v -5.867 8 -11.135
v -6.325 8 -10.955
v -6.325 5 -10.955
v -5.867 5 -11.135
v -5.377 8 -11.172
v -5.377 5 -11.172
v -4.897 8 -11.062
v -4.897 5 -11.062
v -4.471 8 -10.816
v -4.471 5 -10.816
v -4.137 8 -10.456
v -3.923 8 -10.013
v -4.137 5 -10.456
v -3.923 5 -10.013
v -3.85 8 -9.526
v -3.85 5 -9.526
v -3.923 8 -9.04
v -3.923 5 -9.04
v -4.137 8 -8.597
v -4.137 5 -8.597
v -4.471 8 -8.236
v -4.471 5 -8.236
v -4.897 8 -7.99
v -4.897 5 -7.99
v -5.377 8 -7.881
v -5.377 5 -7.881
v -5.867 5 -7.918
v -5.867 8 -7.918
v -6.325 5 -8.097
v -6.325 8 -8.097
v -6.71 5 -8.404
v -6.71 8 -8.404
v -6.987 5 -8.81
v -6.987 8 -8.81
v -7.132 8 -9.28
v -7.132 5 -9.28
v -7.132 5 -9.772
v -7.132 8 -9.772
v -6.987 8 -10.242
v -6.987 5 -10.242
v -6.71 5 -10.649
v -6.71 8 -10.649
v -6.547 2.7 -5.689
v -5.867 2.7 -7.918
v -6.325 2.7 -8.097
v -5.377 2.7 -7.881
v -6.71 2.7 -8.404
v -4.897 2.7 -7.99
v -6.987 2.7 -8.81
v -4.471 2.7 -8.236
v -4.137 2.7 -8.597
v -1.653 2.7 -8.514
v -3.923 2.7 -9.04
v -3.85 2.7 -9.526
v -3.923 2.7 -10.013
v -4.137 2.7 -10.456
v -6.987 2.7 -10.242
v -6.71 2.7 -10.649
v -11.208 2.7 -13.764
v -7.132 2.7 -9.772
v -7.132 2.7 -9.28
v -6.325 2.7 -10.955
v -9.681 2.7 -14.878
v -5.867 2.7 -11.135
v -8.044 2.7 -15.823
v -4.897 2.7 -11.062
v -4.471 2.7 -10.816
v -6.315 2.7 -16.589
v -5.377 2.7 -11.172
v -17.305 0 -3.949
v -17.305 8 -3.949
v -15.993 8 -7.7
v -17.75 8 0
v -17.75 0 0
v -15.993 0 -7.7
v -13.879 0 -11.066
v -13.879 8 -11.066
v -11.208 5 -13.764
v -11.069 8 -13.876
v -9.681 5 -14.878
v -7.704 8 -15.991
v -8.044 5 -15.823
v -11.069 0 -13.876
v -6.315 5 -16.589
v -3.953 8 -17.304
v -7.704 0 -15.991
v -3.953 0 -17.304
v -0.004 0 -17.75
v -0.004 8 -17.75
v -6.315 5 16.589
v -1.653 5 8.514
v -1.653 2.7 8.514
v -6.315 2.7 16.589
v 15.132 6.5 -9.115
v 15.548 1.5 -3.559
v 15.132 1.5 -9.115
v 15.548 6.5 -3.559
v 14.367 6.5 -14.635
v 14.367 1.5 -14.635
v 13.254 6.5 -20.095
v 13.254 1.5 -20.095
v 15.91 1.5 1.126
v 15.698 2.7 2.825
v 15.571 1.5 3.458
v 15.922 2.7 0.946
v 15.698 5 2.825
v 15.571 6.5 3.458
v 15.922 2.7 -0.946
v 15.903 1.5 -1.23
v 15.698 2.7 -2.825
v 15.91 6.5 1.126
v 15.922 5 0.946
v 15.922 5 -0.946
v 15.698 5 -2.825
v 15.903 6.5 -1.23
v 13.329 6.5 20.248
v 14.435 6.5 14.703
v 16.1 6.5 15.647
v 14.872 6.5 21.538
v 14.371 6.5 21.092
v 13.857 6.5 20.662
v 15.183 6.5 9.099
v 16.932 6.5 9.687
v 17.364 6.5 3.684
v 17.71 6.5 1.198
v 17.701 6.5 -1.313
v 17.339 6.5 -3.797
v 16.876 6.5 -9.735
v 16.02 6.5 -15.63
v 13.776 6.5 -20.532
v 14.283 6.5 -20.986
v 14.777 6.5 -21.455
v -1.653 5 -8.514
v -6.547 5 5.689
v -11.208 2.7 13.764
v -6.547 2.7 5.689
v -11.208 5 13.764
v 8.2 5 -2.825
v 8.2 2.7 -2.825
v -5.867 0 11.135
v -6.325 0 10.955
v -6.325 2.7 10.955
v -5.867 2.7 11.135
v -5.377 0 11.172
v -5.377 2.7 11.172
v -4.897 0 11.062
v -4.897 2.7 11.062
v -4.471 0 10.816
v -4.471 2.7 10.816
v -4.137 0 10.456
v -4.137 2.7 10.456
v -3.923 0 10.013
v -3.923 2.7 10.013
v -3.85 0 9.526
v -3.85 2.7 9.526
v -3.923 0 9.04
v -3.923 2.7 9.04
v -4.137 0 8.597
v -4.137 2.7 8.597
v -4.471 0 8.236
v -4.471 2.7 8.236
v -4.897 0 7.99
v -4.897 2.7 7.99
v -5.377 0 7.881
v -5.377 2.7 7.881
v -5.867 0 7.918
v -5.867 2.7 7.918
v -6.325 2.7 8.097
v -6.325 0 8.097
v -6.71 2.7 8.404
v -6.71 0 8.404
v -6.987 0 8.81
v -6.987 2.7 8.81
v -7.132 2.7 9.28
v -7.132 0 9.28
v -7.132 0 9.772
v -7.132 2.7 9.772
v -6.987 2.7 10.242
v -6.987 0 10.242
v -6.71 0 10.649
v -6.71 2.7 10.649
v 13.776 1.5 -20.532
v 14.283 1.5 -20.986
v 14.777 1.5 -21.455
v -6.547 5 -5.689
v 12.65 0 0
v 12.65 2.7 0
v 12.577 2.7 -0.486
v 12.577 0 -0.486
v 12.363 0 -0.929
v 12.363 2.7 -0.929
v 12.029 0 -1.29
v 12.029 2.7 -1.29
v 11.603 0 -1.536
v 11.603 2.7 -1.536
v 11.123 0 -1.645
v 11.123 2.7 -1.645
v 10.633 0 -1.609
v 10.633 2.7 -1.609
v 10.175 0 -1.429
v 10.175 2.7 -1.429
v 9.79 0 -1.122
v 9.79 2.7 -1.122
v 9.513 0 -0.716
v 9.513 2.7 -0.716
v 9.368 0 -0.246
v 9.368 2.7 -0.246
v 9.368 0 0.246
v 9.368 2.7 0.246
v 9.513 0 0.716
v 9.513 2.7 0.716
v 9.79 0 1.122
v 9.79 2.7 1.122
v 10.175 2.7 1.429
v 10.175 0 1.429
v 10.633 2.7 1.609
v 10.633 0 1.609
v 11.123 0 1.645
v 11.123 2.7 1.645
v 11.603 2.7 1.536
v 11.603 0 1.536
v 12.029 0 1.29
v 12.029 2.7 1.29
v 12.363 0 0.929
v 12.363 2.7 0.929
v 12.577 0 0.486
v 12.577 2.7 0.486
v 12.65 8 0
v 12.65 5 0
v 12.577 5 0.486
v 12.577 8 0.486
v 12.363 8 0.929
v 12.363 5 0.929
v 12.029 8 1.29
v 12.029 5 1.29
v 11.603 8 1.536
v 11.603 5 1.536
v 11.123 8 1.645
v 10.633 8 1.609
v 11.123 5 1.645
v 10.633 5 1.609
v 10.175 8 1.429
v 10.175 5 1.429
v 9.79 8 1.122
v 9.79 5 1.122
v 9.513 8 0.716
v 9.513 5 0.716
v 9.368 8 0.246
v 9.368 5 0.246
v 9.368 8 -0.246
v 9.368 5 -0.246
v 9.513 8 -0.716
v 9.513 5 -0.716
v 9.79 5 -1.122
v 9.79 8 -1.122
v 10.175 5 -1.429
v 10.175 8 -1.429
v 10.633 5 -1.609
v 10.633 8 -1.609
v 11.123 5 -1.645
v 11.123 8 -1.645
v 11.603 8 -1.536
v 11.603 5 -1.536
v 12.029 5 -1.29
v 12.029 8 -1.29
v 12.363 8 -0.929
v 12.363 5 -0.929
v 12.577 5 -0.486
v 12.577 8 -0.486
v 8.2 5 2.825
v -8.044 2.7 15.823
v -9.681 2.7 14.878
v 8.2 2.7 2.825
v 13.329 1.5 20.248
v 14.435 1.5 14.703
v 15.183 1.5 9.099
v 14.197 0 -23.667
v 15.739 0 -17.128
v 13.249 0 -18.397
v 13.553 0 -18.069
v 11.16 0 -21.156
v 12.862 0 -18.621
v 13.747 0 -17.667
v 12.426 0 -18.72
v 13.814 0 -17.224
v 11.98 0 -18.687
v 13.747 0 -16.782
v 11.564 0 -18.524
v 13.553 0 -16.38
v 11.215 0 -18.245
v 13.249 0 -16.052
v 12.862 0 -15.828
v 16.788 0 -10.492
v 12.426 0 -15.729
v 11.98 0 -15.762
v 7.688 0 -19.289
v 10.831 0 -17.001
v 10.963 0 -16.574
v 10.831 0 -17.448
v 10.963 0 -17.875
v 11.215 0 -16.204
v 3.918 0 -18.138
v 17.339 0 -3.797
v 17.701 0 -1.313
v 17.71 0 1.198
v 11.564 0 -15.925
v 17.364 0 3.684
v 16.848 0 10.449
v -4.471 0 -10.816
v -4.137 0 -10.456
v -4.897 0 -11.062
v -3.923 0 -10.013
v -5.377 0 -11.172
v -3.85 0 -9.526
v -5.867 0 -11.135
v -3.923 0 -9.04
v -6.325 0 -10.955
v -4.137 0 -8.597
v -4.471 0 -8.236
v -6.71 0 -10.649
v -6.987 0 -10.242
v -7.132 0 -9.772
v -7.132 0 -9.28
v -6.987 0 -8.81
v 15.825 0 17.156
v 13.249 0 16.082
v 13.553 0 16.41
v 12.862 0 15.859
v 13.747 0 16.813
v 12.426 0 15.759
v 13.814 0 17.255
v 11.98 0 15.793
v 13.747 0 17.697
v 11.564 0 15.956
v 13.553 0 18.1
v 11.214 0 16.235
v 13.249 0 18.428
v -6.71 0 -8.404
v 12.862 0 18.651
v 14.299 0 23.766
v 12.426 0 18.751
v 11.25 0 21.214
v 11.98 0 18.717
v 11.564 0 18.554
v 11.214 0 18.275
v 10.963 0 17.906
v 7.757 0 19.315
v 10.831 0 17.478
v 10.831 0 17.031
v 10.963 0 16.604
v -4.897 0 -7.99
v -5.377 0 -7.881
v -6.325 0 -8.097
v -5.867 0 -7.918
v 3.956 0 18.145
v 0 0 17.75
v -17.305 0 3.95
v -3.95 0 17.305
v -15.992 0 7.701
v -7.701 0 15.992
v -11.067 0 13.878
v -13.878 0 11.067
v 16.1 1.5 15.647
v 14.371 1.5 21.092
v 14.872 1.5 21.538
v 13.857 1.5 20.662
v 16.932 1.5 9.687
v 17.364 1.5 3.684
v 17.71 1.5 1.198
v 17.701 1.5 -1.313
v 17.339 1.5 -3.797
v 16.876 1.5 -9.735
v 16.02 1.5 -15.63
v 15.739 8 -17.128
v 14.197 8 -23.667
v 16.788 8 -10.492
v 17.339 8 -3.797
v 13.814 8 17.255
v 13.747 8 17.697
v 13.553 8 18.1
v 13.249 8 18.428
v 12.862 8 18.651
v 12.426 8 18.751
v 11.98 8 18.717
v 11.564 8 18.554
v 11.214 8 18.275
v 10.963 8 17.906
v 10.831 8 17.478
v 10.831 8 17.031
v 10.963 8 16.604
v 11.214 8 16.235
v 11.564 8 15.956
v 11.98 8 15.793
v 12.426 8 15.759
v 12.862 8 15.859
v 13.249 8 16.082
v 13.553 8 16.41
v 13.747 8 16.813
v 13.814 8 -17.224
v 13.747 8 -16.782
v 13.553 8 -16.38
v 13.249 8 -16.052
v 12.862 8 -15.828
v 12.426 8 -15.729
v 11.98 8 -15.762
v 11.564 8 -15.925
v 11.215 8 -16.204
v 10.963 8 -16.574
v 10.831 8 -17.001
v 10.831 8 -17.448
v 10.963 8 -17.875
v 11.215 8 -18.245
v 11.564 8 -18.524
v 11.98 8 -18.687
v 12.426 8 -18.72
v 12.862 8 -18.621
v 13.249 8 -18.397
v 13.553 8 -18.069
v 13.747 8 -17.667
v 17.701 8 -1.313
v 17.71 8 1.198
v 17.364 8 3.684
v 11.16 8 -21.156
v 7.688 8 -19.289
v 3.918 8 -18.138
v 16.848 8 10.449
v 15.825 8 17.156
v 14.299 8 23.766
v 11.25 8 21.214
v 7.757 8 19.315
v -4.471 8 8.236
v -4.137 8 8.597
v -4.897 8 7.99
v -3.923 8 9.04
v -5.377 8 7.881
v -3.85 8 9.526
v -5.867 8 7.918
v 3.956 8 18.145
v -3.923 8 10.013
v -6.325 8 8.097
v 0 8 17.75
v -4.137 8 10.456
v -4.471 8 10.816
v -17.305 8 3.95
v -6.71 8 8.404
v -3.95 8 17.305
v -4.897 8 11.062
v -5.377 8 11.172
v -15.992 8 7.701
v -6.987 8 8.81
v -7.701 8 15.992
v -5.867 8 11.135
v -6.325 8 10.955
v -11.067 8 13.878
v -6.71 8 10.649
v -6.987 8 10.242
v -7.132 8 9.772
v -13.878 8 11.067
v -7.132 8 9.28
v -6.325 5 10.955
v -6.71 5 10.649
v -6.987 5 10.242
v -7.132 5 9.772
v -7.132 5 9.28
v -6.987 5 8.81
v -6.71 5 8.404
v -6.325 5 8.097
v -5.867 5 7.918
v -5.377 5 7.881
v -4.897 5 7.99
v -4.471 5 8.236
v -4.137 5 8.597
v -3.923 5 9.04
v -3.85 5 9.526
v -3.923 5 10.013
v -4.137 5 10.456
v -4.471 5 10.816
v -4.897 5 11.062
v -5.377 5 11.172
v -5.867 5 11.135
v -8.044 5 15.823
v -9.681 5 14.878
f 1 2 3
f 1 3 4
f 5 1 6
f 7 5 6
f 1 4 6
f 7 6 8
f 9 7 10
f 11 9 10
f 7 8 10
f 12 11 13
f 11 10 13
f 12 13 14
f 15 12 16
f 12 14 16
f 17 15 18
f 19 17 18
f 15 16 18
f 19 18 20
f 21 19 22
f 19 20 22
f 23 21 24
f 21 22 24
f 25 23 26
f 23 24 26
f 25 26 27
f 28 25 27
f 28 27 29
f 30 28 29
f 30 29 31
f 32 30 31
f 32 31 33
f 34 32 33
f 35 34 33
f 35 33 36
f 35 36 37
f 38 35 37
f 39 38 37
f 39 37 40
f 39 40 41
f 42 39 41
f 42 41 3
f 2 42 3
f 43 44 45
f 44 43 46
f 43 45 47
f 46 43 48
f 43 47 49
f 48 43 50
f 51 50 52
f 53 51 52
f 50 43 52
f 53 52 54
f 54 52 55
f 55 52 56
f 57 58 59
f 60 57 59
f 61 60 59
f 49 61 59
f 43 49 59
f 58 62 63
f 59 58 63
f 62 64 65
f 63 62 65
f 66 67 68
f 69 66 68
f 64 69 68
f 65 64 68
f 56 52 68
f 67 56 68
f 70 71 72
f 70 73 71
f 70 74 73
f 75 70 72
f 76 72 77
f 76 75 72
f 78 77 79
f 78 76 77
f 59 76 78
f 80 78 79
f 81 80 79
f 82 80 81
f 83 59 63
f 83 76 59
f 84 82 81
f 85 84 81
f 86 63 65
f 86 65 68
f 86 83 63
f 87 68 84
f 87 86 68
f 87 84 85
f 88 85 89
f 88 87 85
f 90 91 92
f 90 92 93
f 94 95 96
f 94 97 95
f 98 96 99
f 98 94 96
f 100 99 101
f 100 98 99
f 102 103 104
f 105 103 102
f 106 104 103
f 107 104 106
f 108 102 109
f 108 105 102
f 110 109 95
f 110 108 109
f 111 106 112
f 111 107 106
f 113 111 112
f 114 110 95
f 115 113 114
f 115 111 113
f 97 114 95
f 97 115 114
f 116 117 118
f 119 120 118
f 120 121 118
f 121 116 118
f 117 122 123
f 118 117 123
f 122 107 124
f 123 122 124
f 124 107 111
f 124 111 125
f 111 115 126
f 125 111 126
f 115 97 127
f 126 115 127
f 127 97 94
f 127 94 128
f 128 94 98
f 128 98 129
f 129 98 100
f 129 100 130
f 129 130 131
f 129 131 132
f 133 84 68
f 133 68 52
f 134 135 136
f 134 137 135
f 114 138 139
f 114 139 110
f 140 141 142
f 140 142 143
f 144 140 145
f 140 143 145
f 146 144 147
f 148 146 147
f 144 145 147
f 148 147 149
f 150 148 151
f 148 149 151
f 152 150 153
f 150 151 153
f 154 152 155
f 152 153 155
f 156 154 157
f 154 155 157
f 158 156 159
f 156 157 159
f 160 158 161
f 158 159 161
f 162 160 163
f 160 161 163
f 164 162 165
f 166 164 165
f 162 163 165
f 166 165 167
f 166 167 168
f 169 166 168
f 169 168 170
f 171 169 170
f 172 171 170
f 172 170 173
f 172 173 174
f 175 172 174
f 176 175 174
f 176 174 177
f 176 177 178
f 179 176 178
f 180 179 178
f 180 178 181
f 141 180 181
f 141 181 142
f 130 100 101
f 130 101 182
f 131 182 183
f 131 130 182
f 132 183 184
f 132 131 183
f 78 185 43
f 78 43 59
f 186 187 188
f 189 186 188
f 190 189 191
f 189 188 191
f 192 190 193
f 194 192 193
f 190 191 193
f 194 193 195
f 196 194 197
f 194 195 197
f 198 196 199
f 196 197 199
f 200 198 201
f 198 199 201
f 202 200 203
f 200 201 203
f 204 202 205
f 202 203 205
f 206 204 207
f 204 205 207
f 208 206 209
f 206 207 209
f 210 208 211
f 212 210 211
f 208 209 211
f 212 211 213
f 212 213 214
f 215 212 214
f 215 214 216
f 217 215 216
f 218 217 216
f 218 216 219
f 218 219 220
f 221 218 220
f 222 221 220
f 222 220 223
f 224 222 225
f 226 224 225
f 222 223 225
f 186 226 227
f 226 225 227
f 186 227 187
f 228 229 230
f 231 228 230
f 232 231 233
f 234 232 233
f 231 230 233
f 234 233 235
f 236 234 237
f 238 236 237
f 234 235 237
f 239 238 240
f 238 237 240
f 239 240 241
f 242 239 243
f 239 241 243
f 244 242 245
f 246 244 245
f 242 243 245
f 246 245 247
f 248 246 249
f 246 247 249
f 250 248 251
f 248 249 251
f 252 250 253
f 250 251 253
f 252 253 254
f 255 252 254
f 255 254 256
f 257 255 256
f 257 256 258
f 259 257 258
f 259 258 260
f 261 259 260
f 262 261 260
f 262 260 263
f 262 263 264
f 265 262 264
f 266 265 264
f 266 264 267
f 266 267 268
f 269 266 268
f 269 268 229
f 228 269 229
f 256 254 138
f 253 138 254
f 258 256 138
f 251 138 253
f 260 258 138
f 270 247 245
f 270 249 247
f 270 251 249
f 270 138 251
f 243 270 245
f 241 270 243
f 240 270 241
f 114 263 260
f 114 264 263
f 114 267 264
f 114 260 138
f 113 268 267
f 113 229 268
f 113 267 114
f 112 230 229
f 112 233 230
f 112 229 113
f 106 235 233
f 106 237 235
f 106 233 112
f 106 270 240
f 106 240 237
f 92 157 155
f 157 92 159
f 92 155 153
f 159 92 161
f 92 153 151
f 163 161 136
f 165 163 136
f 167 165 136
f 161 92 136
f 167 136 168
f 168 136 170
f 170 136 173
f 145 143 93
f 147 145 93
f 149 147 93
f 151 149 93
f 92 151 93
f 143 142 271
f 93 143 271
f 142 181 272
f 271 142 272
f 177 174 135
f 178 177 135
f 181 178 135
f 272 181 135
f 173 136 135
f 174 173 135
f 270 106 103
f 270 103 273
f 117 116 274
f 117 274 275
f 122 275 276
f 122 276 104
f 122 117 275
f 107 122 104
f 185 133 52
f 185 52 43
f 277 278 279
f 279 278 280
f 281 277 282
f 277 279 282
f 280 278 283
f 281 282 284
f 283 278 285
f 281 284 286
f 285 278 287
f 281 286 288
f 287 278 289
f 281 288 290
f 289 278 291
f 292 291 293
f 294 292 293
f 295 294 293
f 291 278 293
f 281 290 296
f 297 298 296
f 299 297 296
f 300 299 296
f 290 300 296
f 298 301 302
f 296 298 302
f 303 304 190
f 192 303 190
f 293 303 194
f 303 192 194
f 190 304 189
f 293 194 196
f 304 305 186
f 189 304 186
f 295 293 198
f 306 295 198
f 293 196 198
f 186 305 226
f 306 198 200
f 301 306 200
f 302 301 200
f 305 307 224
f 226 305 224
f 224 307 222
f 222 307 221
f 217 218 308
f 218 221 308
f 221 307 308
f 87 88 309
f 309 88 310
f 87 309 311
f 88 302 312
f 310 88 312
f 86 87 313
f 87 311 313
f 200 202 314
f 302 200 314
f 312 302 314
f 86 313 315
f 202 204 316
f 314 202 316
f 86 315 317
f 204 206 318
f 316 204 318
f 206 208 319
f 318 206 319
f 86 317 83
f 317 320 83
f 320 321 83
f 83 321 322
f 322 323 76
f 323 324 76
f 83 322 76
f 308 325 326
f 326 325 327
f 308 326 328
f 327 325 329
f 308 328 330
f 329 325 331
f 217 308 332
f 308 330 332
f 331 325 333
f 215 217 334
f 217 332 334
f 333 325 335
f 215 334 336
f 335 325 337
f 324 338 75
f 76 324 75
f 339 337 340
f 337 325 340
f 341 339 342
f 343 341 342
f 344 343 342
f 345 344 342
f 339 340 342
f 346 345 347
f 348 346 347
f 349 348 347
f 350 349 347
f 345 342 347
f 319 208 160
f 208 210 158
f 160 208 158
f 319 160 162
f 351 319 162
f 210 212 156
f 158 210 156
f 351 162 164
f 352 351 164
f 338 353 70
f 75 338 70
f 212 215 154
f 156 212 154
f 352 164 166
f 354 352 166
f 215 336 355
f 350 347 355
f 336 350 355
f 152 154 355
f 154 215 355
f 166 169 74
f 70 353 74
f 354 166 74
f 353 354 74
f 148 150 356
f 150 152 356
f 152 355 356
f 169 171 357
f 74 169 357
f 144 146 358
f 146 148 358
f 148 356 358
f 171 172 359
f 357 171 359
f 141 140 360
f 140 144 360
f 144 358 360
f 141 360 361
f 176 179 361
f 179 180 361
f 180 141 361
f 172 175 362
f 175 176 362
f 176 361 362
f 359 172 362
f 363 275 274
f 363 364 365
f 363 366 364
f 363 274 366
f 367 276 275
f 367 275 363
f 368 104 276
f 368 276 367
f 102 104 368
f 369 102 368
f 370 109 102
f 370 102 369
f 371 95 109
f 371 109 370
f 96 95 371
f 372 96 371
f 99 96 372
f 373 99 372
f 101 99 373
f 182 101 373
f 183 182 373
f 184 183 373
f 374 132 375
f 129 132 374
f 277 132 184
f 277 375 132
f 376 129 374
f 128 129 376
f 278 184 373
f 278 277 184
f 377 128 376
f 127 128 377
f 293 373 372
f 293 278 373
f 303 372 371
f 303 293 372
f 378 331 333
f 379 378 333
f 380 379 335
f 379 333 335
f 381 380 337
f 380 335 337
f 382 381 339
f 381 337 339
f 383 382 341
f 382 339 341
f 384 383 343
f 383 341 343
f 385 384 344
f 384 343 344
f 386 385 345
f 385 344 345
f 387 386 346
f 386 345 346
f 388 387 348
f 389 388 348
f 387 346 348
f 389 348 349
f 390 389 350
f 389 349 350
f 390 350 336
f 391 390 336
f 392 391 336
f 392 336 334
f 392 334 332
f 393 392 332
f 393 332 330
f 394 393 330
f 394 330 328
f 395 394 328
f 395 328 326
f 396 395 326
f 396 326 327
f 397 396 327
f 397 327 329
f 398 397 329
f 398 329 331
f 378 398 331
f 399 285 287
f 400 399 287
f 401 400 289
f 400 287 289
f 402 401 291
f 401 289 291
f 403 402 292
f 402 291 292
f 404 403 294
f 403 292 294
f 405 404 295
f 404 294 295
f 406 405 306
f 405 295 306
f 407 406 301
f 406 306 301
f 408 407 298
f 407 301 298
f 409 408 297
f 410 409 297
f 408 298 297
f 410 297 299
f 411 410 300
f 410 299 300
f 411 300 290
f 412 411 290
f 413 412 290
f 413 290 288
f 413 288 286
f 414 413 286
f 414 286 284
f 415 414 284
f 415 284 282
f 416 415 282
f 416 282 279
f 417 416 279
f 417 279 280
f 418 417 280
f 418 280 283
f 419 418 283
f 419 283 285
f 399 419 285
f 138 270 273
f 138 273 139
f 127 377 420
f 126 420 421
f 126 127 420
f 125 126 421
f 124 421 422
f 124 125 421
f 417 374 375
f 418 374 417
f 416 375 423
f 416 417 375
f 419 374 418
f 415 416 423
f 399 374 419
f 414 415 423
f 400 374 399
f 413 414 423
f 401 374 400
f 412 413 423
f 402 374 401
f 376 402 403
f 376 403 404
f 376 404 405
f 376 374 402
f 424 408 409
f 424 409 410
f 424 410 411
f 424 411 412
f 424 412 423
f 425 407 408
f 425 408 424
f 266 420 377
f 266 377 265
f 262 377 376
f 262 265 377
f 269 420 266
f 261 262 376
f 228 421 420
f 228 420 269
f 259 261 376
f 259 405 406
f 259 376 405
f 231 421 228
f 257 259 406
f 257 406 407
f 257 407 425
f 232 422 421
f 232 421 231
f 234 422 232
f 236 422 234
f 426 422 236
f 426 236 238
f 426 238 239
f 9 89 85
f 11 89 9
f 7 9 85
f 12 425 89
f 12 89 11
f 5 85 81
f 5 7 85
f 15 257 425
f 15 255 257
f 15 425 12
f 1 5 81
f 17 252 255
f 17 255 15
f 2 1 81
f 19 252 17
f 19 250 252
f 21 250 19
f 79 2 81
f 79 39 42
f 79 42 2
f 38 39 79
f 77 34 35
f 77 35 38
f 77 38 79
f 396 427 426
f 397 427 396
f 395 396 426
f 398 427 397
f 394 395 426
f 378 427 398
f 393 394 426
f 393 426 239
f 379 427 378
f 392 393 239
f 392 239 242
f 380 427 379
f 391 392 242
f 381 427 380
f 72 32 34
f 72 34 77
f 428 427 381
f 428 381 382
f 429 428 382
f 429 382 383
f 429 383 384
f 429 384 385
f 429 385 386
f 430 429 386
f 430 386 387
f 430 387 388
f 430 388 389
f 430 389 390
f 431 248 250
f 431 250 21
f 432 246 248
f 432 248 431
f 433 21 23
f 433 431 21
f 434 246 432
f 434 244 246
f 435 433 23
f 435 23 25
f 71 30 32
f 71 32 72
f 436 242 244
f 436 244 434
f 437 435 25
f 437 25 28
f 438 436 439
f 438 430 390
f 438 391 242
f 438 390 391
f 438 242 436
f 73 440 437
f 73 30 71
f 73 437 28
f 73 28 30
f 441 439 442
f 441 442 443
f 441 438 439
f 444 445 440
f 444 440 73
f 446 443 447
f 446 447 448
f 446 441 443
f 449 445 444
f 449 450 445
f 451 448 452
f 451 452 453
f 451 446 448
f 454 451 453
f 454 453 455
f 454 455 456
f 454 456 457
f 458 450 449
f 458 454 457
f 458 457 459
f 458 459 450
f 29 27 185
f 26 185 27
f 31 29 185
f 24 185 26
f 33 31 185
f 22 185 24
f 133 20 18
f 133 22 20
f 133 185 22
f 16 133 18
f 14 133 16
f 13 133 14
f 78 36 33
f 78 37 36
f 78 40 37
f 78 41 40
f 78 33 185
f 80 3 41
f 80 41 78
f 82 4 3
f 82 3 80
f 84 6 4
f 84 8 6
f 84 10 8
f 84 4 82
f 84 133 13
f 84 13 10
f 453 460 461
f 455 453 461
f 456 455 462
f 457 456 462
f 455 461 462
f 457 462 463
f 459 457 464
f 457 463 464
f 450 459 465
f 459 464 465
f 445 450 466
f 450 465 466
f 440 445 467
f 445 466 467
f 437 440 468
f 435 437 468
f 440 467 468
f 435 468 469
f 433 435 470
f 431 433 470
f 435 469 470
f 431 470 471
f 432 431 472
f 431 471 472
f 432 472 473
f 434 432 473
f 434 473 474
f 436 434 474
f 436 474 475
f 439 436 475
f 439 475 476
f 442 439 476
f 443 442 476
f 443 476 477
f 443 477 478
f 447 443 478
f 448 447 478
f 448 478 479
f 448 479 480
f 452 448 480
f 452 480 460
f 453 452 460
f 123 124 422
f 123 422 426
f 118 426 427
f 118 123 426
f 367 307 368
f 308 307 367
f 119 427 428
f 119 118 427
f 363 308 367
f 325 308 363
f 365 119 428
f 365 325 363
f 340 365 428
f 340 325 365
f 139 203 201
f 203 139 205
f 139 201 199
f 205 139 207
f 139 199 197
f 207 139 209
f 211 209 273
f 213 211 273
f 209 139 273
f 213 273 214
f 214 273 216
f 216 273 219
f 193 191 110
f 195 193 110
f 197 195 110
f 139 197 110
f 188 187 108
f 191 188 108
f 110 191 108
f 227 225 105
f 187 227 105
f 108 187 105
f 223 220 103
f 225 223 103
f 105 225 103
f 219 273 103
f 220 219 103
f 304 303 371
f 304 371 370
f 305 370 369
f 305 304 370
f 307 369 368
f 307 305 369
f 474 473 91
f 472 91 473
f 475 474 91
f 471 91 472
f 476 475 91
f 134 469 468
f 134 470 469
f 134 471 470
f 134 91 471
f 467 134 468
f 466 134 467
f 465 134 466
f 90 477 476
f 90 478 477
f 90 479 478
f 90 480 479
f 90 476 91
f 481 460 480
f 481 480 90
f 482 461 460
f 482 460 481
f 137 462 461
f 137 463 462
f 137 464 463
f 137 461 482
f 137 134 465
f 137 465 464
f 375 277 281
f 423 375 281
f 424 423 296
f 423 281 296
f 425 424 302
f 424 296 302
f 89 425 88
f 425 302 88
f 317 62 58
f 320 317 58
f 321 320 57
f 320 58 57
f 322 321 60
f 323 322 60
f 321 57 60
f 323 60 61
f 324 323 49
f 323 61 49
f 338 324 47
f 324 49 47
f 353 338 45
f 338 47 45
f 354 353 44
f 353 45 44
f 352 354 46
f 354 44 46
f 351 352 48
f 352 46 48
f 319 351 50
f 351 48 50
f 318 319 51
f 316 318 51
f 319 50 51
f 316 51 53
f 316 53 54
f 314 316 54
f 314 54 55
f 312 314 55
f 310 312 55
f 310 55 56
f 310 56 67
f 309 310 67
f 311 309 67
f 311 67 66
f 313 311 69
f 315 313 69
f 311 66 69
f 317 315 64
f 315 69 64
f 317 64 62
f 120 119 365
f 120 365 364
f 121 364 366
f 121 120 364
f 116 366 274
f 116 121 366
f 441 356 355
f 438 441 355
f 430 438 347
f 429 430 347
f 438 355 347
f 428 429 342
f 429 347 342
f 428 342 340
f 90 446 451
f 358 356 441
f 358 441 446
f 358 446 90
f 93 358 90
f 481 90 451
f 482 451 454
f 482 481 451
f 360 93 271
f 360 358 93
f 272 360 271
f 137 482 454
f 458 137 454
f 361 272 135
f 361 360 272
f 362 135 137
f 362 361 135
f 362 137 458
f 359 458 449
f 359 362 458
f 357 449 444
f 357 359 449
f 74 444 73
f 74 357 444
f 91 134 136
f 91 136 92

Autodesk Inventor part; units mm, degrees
ref_plane "YZ Plane" through (0, 0, 0) normal (1, 0, 0) x (0, 1, 0)
ref_plane "XZ Plane" through (0, 0, 0) normal (0, 1, 0) x (-1, 0, 0)
sketch "Esquisse1" plane through (0, 0, 0) normal (0, 1, 0) x (-1, 0, 0)
  circle A0 centre (0, 0) radius 17.75
  dimension "d0" = 35.5
extrude "Extrusion1" add sketch "Esquisse1" along normal blind 8
ref_plane "Plan de construction1" through (0, 5, 0) normal (0, -1, 0) x (1, 0, 0)
sketch "Esquisse2" plane through (0, 5, 0) normal (0, -1, 0) x (1, 0, 0)
  circle A0 centre (0, 0) radius 17.75 construction
  line L0 (0, 0) -> (11, 0) construction
  circle A1 centre (11, 0) radius 1.65
  dimension "d4" = 11
  dimension "d5" = 3.3
extrude "Extrusion2" cut sketch "Esquisse2" along normal through all both and the other way through all
sketch "Esquisse3" plane through (0, 5, 0) normal (0, -1, 0) x (1, 0, 0)
  line L0 (23.2, 2.825) -> (8.2, 2.825)
  line L1 (8.2, 2.825) -> (8.2, -2.825)
  line L2 (8.2, -2.825) -> (23.2, -2.825)
  line L3 (23.2, -2.825) -> (23.2, 2.825)
  circle A0 centre (11, 0) radius 1.65 construction
  circle A1 centre (0, 0) radius 17.75 construction
  line L4 (0, 0) -> (8.2, 0) construction
  dimension "d8" = 5.65
  dimension "d9" = 2.8
  dimension "d10" = 15
extrude "Extrusion3" cut sketch "Esquisse3" along normal blind 2.3
pattern_circular "Réseau circulaire1" count 3 over 360 about axis through (0, 0, 0) along (0, -1, 0) of "Extrusion3", "Extrusion2"
ref_plane "Work Plane2" through (0, 6.5, 0) normal (0, 1, 0) x (1, 0, 0)
sketch "Sketch4" plane through (0, 6.5, 0) normal (0, 1, 0) x (1, 0, 0)
  circle A0 centre (0, 0) radius 17
  circle A1 centre (-5.5, -9.5263) radius 1.65 projected
  circle A2 centre (11, 0) radius 1.65 projected
  circle A3 centre (0, 0) radius 17.75 projected
  circle A4 centre (0, 0) radius 17.75 projected
  line L0 (-5.1051, -17) -> (-5.1051, 17)
  dimension "d17" = 34
extrude "Extrusion4" [suppressed]
sketch "Sketch7" plane through (0, 0, 0) normal (0, -1, 0) x (1, 0, 0)
  circle A0 centre (-5.5, -9.5263) radius 1.65 projected
  circle A1 centre (-5.5, 9.5263) radius 1.65 projected
  circle A2 centre (11, 0) radius 1.65 projected
  circle A3 centre (0, 0) radius 17.75 projected
  arc A4 (12.2653, -21.0869) -> (-1.702, -23.304) centre (6.3902, -29.1791) ccw construction
  line L0 (12.2653, -21.0869) -> (14.1974, -23.6673) construction
  arc A5 (16.0148, -22.871) -> (19.1393, -21.699) centre (17.1898, -21.2525) ccw construction
  arc A6 (19.1393, -21.699) -> (17.9505, 23.1047) centre (-68.5898, -1.6093) ccw construction
  arc A7 (17.9505, 23.1047) -> (14.8221, 24.7813) centre (15.9506, 23.1301) ccw construction
  line L1 (14.8221, 24.7813) -> (14.299, 23.7665) construction
  circle A8 centre (10.9719, 0.0309) radius 1.5
  circle A9 centre (12.314, 17.2549) radius 1.5
  circle A10 centre (12.3141, -17.2245) radius 1.5
  circle A11 centre (10.9719, -0.0082) radius 3
  circle A12 centre (10.9719, -0.0082) radius 1.5
  circle A13 centre (12.3141, -17.2245) radius 1.5
  circle A14 centre (12.3141, -17.2245) radius 1.5
  arc A15 (14.1974, -23.6673) -> (17.3392, -3.7967) centre (-72.5704, 0.2356) ccw
  arc A16 (17.3635, 3.6841) -> (14.299, 23.7665) centre (-72.5704, 0.2356) ccw
  circle A17 centre (0, 0) radius 17.75 projected
  arc A18 (14.1974, -23.6673) -> (-0.0039, -17.75) centre (-0.0039, -37.75) ccw
  arc A19 (0, 17.75) -> (14.299, 23.7665) centre (0, 37.75) ccw
  circle A20 centre (-5.5, -9.5263) radius 1.65 projected
  circle A21 centre (-5.5, 9.5263) radius 1.65 projected
  circle A22 centre (11, 0) radius 1.65 projected
  circle A23 centre (0, 0) radius 17.75 projected
  dimension "d50" = 1.3141
  dimension "d51" = 17.2245
  dimension "d53" = 20
  dimension "d54" = 20
  dimension "d61" = 1.314
  dimension "d62" = 17.224
  dimension "d63" = 90
  dimension "d64" = 90
  dimension "d66" = 20
  dimension "d67" = 20
extrude "Extrusion5" add sketch "Sketch7" against normal blind 8 contours A3 A19 A16 | A15 A18 A3
sketch "Sketch8" plane through (0, 8, 0) normal (0, 1, 0) x (1, 0, 0)
  circle A0 centre (12.3141, 17.2245) radius 1.5 projected
  circle A1 centre (12.314, -17.2549) radius 1.5 projected
  circle A2 centre (-5.5, 9.5263) radius 1.65 projected
  circle A3 centre (-5.5, -9.5263) radius 1.65 projected
  circle A4 centre (11, 0) radius 1.65 projected
  arc A5 (-0.0039, 17.75) -> (0, -17.75) centre (0, 0) ccw projected
  arc A6 (14.299, -23.7665) -> (0, -17.75) centre (0, -37.75) ccw projected
  arc A7 (14.299, -23.7665) -> (17.3635, -3.6841) centre (-72.5704, -0.2356) ccw projected
  arc A8 (17.3635, -3.6841) -> (17.3392, 3.7967) centre (0, 0) ccw projected
  arc A9 (17.3392, 3.7967) -> (14.1974, 23.6673) centre (-72.5704, -0.2356) ccw projected
  arc A10 (-0.0039, 17.75) -> (14.1974, 23.6673) centre (-0.0039, 37.75) ccw projected
  arc A11 (14.299, -23.7665) -> (0, -17.75) centre (0, -37.75) ccw projected
  arc A12 (14.8721, -21.5382) -> (13.3292, -20.2477) centre (0, -37.75) ccw
  arc A13 (12.6827, -1.3087) -> (12.7364, 0.5886) centre (0, 0) ccw
  arc A14 (10.3425, 14.4255) -> (10.6571, 14.5677) centre (-0.0039, 37.75) ccw
  arc A15 (15.5707, -3.4578) -> (15.5479, 3.5588) centre (0, 0) ccw
  arc A16 (15.5479, 3.5588) -> (13.2545, 20.0947) centre (-72.5704, -0.2356) ccw
  arc A17 (17.3392, 3.7967) -> (14.1974, 23.6673) centre (-72.5704, -0.2356) ccw projected
  arc A18 (13.3292, -20.2477) -> (15.5707, -3.4578) centre (-72.5704, -0.2356) ccw
  arc A19 (11.9075, 19.0825) -> (11.9222, 19.0926) centre (-0.6265, 37.1628) ccw
  arc A20 (13.2545, 20.0947) -> (14.7767, 21.4548) centre (-0.6265, 37.1628) ccw
  dimension "d59" = 2
  dimension "d68" = 1.8
  dimension "d69" = 1.8
ref_plane "Work Plane3" through (0, 6.5, 0) normal (0, 1, 0) x (1, 0, 0)
ref_plane "Work Plane4" through (0, 1.5, 0) normal (0, -1, 0) x (1, 0, 0)
extrude "Extrusion6" cut sketch "Sketch8" against normal up to surface (5 mm away) from surface at -1.5 contours A9 A8 A7 A12 A18 A15 A16 A20
equation "\"d6\" = d5"
properties part number "capacitor_glue"
